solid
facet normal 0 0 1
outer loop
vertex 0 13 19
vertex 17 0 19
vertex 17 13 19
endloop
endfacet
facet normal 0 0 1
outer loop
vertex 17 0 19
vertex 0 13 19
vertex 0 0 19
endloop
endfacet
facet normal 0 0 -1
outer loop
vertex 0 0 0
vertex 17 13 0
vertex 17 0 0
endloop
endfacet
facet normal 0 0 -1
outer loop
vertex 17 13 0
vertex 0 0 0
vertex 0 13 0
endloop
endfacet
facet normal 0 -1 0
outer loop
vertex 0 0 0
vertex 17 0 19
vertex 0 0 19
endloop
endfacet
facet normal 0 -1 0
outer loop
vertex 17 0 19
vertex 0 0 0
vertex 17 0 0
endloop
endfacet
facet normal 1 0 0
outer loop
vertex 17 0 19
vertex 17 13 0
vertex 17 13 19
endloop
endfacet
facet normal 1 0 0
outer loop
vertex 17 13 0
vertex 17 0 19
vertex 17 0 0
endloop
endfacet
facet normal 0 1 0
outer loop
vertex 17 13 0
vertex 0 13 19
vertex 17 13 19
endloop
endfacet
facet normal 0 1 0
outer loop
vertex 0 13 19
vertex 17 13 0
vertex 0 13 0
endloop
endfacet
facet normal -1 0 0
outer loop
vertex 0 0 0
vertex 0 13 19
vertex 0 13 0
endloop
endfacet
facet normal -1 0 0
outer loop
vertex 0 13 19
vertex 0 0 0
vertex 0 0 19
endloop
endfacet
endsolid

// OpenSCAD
// Generated by SolidPython 1.0.1 on 2020-07-29 00:46:56


cube(size = [17, 13, 19]);
/***********************************************
*********      SolidPython code:      **********
************************************************
 
# import packages: SolidPython
from solid import *
from solid.utils import *
from itertools import chain, combinations, permutations


class Resize:

    def __init__(self, scad_file):
        self.scad_file = scad_file
        #self.scad_file = import_scad(scad_file)
        # cone/cylinder param:
        self.r1 = 0
        self.r2 = 0
        self.h = 0
        # rectangular prism param:
        self.w = 0
        self.l = 0
        # ellipse param:
        self.r = 0

    # import OpenScad code (file name corresponds to shape)


    # classify shape + parameters
    def assign(self, param1, param2, param3):
        if self.scad_file == 'cone.scad':
            self.r1 = param1
            self.r2 = param2
            self.h = param3
        elif self.scad_file == 'cylinder.scad':
            self.r1 = param1
            self.r2 = param2
            self.h = param3
        elif self.scad_file == 'rectangularPrism.scad':
            self.h = param1
            self.l = param2
            self.w = param3
        else:
            self.r = param1
            self.h = param2

    # resize parameters
    def iterate(self):
        x = range(3, 20, 2)
        i = 1
        if self.scad_file == 'cone.scad':
            tempList = list(permutations(x, 2))
            for temp in tempList:
                param1 = temp[0]
                param2 = temp[1]
                filepath = 'produced_scad_files/' + 'cone' + str(param1) + '_' + str(param2) + '_' + '.scad'
                scad_render_to_file(cylinder(h=param1, r1=param2, r2=0), filepath)

        elif self.scad_file == 'cylinder.scad':
            tempList = list(permutations(x, 3))
            for temp in tempList:
                param1 = temp[0]
                param2 = temp[1]
                filepath = 'produced_scad_files/' + 'cylinder' + str(param1) + '_' + str(param2) + '_' + '.scad'
                scad_render_to_file(cylinder(h=param1, r1=param2, r2=param2), filepath)

        elif self.scad_file == 'rectangularPrism.scad':
            tempList = list(permutations(x, 3))
            for temp in tempList:
                param1 = temp[0]
                param2 = temp[1]
                param3 = temp[2]
                filepath = 'produced_scad_files/' + 'rectangularPrism' + str(param1) + '_' + str(param2) + '_' + str(
                    param3) + '.scad'
                scad_render_to_file(cube(size=(param1, param2, param3)), filepath)

        elif self.scad_file == 'ellipse.scad':
            tempList = list(permutations(x, 4))
            for temp in tempList:
                param1 = temp[0]
                param2 = temp[1]
                param3 = temp[2]
                param4 = temp[3]
                filepath = 'produced_scad_files/' + 'ellipse' + str(param1) + '_' + str(param2) + '_' + str(param3) + '_' + str(param4) + '.scad'
                scad_render_to_file(scale([param1, param2, param3])(sphere(r=param4)), filepath)

    def render_to_scadfile(self):
        scad_render_to_file(scad, 'example.scad') 
 
************************************************/
